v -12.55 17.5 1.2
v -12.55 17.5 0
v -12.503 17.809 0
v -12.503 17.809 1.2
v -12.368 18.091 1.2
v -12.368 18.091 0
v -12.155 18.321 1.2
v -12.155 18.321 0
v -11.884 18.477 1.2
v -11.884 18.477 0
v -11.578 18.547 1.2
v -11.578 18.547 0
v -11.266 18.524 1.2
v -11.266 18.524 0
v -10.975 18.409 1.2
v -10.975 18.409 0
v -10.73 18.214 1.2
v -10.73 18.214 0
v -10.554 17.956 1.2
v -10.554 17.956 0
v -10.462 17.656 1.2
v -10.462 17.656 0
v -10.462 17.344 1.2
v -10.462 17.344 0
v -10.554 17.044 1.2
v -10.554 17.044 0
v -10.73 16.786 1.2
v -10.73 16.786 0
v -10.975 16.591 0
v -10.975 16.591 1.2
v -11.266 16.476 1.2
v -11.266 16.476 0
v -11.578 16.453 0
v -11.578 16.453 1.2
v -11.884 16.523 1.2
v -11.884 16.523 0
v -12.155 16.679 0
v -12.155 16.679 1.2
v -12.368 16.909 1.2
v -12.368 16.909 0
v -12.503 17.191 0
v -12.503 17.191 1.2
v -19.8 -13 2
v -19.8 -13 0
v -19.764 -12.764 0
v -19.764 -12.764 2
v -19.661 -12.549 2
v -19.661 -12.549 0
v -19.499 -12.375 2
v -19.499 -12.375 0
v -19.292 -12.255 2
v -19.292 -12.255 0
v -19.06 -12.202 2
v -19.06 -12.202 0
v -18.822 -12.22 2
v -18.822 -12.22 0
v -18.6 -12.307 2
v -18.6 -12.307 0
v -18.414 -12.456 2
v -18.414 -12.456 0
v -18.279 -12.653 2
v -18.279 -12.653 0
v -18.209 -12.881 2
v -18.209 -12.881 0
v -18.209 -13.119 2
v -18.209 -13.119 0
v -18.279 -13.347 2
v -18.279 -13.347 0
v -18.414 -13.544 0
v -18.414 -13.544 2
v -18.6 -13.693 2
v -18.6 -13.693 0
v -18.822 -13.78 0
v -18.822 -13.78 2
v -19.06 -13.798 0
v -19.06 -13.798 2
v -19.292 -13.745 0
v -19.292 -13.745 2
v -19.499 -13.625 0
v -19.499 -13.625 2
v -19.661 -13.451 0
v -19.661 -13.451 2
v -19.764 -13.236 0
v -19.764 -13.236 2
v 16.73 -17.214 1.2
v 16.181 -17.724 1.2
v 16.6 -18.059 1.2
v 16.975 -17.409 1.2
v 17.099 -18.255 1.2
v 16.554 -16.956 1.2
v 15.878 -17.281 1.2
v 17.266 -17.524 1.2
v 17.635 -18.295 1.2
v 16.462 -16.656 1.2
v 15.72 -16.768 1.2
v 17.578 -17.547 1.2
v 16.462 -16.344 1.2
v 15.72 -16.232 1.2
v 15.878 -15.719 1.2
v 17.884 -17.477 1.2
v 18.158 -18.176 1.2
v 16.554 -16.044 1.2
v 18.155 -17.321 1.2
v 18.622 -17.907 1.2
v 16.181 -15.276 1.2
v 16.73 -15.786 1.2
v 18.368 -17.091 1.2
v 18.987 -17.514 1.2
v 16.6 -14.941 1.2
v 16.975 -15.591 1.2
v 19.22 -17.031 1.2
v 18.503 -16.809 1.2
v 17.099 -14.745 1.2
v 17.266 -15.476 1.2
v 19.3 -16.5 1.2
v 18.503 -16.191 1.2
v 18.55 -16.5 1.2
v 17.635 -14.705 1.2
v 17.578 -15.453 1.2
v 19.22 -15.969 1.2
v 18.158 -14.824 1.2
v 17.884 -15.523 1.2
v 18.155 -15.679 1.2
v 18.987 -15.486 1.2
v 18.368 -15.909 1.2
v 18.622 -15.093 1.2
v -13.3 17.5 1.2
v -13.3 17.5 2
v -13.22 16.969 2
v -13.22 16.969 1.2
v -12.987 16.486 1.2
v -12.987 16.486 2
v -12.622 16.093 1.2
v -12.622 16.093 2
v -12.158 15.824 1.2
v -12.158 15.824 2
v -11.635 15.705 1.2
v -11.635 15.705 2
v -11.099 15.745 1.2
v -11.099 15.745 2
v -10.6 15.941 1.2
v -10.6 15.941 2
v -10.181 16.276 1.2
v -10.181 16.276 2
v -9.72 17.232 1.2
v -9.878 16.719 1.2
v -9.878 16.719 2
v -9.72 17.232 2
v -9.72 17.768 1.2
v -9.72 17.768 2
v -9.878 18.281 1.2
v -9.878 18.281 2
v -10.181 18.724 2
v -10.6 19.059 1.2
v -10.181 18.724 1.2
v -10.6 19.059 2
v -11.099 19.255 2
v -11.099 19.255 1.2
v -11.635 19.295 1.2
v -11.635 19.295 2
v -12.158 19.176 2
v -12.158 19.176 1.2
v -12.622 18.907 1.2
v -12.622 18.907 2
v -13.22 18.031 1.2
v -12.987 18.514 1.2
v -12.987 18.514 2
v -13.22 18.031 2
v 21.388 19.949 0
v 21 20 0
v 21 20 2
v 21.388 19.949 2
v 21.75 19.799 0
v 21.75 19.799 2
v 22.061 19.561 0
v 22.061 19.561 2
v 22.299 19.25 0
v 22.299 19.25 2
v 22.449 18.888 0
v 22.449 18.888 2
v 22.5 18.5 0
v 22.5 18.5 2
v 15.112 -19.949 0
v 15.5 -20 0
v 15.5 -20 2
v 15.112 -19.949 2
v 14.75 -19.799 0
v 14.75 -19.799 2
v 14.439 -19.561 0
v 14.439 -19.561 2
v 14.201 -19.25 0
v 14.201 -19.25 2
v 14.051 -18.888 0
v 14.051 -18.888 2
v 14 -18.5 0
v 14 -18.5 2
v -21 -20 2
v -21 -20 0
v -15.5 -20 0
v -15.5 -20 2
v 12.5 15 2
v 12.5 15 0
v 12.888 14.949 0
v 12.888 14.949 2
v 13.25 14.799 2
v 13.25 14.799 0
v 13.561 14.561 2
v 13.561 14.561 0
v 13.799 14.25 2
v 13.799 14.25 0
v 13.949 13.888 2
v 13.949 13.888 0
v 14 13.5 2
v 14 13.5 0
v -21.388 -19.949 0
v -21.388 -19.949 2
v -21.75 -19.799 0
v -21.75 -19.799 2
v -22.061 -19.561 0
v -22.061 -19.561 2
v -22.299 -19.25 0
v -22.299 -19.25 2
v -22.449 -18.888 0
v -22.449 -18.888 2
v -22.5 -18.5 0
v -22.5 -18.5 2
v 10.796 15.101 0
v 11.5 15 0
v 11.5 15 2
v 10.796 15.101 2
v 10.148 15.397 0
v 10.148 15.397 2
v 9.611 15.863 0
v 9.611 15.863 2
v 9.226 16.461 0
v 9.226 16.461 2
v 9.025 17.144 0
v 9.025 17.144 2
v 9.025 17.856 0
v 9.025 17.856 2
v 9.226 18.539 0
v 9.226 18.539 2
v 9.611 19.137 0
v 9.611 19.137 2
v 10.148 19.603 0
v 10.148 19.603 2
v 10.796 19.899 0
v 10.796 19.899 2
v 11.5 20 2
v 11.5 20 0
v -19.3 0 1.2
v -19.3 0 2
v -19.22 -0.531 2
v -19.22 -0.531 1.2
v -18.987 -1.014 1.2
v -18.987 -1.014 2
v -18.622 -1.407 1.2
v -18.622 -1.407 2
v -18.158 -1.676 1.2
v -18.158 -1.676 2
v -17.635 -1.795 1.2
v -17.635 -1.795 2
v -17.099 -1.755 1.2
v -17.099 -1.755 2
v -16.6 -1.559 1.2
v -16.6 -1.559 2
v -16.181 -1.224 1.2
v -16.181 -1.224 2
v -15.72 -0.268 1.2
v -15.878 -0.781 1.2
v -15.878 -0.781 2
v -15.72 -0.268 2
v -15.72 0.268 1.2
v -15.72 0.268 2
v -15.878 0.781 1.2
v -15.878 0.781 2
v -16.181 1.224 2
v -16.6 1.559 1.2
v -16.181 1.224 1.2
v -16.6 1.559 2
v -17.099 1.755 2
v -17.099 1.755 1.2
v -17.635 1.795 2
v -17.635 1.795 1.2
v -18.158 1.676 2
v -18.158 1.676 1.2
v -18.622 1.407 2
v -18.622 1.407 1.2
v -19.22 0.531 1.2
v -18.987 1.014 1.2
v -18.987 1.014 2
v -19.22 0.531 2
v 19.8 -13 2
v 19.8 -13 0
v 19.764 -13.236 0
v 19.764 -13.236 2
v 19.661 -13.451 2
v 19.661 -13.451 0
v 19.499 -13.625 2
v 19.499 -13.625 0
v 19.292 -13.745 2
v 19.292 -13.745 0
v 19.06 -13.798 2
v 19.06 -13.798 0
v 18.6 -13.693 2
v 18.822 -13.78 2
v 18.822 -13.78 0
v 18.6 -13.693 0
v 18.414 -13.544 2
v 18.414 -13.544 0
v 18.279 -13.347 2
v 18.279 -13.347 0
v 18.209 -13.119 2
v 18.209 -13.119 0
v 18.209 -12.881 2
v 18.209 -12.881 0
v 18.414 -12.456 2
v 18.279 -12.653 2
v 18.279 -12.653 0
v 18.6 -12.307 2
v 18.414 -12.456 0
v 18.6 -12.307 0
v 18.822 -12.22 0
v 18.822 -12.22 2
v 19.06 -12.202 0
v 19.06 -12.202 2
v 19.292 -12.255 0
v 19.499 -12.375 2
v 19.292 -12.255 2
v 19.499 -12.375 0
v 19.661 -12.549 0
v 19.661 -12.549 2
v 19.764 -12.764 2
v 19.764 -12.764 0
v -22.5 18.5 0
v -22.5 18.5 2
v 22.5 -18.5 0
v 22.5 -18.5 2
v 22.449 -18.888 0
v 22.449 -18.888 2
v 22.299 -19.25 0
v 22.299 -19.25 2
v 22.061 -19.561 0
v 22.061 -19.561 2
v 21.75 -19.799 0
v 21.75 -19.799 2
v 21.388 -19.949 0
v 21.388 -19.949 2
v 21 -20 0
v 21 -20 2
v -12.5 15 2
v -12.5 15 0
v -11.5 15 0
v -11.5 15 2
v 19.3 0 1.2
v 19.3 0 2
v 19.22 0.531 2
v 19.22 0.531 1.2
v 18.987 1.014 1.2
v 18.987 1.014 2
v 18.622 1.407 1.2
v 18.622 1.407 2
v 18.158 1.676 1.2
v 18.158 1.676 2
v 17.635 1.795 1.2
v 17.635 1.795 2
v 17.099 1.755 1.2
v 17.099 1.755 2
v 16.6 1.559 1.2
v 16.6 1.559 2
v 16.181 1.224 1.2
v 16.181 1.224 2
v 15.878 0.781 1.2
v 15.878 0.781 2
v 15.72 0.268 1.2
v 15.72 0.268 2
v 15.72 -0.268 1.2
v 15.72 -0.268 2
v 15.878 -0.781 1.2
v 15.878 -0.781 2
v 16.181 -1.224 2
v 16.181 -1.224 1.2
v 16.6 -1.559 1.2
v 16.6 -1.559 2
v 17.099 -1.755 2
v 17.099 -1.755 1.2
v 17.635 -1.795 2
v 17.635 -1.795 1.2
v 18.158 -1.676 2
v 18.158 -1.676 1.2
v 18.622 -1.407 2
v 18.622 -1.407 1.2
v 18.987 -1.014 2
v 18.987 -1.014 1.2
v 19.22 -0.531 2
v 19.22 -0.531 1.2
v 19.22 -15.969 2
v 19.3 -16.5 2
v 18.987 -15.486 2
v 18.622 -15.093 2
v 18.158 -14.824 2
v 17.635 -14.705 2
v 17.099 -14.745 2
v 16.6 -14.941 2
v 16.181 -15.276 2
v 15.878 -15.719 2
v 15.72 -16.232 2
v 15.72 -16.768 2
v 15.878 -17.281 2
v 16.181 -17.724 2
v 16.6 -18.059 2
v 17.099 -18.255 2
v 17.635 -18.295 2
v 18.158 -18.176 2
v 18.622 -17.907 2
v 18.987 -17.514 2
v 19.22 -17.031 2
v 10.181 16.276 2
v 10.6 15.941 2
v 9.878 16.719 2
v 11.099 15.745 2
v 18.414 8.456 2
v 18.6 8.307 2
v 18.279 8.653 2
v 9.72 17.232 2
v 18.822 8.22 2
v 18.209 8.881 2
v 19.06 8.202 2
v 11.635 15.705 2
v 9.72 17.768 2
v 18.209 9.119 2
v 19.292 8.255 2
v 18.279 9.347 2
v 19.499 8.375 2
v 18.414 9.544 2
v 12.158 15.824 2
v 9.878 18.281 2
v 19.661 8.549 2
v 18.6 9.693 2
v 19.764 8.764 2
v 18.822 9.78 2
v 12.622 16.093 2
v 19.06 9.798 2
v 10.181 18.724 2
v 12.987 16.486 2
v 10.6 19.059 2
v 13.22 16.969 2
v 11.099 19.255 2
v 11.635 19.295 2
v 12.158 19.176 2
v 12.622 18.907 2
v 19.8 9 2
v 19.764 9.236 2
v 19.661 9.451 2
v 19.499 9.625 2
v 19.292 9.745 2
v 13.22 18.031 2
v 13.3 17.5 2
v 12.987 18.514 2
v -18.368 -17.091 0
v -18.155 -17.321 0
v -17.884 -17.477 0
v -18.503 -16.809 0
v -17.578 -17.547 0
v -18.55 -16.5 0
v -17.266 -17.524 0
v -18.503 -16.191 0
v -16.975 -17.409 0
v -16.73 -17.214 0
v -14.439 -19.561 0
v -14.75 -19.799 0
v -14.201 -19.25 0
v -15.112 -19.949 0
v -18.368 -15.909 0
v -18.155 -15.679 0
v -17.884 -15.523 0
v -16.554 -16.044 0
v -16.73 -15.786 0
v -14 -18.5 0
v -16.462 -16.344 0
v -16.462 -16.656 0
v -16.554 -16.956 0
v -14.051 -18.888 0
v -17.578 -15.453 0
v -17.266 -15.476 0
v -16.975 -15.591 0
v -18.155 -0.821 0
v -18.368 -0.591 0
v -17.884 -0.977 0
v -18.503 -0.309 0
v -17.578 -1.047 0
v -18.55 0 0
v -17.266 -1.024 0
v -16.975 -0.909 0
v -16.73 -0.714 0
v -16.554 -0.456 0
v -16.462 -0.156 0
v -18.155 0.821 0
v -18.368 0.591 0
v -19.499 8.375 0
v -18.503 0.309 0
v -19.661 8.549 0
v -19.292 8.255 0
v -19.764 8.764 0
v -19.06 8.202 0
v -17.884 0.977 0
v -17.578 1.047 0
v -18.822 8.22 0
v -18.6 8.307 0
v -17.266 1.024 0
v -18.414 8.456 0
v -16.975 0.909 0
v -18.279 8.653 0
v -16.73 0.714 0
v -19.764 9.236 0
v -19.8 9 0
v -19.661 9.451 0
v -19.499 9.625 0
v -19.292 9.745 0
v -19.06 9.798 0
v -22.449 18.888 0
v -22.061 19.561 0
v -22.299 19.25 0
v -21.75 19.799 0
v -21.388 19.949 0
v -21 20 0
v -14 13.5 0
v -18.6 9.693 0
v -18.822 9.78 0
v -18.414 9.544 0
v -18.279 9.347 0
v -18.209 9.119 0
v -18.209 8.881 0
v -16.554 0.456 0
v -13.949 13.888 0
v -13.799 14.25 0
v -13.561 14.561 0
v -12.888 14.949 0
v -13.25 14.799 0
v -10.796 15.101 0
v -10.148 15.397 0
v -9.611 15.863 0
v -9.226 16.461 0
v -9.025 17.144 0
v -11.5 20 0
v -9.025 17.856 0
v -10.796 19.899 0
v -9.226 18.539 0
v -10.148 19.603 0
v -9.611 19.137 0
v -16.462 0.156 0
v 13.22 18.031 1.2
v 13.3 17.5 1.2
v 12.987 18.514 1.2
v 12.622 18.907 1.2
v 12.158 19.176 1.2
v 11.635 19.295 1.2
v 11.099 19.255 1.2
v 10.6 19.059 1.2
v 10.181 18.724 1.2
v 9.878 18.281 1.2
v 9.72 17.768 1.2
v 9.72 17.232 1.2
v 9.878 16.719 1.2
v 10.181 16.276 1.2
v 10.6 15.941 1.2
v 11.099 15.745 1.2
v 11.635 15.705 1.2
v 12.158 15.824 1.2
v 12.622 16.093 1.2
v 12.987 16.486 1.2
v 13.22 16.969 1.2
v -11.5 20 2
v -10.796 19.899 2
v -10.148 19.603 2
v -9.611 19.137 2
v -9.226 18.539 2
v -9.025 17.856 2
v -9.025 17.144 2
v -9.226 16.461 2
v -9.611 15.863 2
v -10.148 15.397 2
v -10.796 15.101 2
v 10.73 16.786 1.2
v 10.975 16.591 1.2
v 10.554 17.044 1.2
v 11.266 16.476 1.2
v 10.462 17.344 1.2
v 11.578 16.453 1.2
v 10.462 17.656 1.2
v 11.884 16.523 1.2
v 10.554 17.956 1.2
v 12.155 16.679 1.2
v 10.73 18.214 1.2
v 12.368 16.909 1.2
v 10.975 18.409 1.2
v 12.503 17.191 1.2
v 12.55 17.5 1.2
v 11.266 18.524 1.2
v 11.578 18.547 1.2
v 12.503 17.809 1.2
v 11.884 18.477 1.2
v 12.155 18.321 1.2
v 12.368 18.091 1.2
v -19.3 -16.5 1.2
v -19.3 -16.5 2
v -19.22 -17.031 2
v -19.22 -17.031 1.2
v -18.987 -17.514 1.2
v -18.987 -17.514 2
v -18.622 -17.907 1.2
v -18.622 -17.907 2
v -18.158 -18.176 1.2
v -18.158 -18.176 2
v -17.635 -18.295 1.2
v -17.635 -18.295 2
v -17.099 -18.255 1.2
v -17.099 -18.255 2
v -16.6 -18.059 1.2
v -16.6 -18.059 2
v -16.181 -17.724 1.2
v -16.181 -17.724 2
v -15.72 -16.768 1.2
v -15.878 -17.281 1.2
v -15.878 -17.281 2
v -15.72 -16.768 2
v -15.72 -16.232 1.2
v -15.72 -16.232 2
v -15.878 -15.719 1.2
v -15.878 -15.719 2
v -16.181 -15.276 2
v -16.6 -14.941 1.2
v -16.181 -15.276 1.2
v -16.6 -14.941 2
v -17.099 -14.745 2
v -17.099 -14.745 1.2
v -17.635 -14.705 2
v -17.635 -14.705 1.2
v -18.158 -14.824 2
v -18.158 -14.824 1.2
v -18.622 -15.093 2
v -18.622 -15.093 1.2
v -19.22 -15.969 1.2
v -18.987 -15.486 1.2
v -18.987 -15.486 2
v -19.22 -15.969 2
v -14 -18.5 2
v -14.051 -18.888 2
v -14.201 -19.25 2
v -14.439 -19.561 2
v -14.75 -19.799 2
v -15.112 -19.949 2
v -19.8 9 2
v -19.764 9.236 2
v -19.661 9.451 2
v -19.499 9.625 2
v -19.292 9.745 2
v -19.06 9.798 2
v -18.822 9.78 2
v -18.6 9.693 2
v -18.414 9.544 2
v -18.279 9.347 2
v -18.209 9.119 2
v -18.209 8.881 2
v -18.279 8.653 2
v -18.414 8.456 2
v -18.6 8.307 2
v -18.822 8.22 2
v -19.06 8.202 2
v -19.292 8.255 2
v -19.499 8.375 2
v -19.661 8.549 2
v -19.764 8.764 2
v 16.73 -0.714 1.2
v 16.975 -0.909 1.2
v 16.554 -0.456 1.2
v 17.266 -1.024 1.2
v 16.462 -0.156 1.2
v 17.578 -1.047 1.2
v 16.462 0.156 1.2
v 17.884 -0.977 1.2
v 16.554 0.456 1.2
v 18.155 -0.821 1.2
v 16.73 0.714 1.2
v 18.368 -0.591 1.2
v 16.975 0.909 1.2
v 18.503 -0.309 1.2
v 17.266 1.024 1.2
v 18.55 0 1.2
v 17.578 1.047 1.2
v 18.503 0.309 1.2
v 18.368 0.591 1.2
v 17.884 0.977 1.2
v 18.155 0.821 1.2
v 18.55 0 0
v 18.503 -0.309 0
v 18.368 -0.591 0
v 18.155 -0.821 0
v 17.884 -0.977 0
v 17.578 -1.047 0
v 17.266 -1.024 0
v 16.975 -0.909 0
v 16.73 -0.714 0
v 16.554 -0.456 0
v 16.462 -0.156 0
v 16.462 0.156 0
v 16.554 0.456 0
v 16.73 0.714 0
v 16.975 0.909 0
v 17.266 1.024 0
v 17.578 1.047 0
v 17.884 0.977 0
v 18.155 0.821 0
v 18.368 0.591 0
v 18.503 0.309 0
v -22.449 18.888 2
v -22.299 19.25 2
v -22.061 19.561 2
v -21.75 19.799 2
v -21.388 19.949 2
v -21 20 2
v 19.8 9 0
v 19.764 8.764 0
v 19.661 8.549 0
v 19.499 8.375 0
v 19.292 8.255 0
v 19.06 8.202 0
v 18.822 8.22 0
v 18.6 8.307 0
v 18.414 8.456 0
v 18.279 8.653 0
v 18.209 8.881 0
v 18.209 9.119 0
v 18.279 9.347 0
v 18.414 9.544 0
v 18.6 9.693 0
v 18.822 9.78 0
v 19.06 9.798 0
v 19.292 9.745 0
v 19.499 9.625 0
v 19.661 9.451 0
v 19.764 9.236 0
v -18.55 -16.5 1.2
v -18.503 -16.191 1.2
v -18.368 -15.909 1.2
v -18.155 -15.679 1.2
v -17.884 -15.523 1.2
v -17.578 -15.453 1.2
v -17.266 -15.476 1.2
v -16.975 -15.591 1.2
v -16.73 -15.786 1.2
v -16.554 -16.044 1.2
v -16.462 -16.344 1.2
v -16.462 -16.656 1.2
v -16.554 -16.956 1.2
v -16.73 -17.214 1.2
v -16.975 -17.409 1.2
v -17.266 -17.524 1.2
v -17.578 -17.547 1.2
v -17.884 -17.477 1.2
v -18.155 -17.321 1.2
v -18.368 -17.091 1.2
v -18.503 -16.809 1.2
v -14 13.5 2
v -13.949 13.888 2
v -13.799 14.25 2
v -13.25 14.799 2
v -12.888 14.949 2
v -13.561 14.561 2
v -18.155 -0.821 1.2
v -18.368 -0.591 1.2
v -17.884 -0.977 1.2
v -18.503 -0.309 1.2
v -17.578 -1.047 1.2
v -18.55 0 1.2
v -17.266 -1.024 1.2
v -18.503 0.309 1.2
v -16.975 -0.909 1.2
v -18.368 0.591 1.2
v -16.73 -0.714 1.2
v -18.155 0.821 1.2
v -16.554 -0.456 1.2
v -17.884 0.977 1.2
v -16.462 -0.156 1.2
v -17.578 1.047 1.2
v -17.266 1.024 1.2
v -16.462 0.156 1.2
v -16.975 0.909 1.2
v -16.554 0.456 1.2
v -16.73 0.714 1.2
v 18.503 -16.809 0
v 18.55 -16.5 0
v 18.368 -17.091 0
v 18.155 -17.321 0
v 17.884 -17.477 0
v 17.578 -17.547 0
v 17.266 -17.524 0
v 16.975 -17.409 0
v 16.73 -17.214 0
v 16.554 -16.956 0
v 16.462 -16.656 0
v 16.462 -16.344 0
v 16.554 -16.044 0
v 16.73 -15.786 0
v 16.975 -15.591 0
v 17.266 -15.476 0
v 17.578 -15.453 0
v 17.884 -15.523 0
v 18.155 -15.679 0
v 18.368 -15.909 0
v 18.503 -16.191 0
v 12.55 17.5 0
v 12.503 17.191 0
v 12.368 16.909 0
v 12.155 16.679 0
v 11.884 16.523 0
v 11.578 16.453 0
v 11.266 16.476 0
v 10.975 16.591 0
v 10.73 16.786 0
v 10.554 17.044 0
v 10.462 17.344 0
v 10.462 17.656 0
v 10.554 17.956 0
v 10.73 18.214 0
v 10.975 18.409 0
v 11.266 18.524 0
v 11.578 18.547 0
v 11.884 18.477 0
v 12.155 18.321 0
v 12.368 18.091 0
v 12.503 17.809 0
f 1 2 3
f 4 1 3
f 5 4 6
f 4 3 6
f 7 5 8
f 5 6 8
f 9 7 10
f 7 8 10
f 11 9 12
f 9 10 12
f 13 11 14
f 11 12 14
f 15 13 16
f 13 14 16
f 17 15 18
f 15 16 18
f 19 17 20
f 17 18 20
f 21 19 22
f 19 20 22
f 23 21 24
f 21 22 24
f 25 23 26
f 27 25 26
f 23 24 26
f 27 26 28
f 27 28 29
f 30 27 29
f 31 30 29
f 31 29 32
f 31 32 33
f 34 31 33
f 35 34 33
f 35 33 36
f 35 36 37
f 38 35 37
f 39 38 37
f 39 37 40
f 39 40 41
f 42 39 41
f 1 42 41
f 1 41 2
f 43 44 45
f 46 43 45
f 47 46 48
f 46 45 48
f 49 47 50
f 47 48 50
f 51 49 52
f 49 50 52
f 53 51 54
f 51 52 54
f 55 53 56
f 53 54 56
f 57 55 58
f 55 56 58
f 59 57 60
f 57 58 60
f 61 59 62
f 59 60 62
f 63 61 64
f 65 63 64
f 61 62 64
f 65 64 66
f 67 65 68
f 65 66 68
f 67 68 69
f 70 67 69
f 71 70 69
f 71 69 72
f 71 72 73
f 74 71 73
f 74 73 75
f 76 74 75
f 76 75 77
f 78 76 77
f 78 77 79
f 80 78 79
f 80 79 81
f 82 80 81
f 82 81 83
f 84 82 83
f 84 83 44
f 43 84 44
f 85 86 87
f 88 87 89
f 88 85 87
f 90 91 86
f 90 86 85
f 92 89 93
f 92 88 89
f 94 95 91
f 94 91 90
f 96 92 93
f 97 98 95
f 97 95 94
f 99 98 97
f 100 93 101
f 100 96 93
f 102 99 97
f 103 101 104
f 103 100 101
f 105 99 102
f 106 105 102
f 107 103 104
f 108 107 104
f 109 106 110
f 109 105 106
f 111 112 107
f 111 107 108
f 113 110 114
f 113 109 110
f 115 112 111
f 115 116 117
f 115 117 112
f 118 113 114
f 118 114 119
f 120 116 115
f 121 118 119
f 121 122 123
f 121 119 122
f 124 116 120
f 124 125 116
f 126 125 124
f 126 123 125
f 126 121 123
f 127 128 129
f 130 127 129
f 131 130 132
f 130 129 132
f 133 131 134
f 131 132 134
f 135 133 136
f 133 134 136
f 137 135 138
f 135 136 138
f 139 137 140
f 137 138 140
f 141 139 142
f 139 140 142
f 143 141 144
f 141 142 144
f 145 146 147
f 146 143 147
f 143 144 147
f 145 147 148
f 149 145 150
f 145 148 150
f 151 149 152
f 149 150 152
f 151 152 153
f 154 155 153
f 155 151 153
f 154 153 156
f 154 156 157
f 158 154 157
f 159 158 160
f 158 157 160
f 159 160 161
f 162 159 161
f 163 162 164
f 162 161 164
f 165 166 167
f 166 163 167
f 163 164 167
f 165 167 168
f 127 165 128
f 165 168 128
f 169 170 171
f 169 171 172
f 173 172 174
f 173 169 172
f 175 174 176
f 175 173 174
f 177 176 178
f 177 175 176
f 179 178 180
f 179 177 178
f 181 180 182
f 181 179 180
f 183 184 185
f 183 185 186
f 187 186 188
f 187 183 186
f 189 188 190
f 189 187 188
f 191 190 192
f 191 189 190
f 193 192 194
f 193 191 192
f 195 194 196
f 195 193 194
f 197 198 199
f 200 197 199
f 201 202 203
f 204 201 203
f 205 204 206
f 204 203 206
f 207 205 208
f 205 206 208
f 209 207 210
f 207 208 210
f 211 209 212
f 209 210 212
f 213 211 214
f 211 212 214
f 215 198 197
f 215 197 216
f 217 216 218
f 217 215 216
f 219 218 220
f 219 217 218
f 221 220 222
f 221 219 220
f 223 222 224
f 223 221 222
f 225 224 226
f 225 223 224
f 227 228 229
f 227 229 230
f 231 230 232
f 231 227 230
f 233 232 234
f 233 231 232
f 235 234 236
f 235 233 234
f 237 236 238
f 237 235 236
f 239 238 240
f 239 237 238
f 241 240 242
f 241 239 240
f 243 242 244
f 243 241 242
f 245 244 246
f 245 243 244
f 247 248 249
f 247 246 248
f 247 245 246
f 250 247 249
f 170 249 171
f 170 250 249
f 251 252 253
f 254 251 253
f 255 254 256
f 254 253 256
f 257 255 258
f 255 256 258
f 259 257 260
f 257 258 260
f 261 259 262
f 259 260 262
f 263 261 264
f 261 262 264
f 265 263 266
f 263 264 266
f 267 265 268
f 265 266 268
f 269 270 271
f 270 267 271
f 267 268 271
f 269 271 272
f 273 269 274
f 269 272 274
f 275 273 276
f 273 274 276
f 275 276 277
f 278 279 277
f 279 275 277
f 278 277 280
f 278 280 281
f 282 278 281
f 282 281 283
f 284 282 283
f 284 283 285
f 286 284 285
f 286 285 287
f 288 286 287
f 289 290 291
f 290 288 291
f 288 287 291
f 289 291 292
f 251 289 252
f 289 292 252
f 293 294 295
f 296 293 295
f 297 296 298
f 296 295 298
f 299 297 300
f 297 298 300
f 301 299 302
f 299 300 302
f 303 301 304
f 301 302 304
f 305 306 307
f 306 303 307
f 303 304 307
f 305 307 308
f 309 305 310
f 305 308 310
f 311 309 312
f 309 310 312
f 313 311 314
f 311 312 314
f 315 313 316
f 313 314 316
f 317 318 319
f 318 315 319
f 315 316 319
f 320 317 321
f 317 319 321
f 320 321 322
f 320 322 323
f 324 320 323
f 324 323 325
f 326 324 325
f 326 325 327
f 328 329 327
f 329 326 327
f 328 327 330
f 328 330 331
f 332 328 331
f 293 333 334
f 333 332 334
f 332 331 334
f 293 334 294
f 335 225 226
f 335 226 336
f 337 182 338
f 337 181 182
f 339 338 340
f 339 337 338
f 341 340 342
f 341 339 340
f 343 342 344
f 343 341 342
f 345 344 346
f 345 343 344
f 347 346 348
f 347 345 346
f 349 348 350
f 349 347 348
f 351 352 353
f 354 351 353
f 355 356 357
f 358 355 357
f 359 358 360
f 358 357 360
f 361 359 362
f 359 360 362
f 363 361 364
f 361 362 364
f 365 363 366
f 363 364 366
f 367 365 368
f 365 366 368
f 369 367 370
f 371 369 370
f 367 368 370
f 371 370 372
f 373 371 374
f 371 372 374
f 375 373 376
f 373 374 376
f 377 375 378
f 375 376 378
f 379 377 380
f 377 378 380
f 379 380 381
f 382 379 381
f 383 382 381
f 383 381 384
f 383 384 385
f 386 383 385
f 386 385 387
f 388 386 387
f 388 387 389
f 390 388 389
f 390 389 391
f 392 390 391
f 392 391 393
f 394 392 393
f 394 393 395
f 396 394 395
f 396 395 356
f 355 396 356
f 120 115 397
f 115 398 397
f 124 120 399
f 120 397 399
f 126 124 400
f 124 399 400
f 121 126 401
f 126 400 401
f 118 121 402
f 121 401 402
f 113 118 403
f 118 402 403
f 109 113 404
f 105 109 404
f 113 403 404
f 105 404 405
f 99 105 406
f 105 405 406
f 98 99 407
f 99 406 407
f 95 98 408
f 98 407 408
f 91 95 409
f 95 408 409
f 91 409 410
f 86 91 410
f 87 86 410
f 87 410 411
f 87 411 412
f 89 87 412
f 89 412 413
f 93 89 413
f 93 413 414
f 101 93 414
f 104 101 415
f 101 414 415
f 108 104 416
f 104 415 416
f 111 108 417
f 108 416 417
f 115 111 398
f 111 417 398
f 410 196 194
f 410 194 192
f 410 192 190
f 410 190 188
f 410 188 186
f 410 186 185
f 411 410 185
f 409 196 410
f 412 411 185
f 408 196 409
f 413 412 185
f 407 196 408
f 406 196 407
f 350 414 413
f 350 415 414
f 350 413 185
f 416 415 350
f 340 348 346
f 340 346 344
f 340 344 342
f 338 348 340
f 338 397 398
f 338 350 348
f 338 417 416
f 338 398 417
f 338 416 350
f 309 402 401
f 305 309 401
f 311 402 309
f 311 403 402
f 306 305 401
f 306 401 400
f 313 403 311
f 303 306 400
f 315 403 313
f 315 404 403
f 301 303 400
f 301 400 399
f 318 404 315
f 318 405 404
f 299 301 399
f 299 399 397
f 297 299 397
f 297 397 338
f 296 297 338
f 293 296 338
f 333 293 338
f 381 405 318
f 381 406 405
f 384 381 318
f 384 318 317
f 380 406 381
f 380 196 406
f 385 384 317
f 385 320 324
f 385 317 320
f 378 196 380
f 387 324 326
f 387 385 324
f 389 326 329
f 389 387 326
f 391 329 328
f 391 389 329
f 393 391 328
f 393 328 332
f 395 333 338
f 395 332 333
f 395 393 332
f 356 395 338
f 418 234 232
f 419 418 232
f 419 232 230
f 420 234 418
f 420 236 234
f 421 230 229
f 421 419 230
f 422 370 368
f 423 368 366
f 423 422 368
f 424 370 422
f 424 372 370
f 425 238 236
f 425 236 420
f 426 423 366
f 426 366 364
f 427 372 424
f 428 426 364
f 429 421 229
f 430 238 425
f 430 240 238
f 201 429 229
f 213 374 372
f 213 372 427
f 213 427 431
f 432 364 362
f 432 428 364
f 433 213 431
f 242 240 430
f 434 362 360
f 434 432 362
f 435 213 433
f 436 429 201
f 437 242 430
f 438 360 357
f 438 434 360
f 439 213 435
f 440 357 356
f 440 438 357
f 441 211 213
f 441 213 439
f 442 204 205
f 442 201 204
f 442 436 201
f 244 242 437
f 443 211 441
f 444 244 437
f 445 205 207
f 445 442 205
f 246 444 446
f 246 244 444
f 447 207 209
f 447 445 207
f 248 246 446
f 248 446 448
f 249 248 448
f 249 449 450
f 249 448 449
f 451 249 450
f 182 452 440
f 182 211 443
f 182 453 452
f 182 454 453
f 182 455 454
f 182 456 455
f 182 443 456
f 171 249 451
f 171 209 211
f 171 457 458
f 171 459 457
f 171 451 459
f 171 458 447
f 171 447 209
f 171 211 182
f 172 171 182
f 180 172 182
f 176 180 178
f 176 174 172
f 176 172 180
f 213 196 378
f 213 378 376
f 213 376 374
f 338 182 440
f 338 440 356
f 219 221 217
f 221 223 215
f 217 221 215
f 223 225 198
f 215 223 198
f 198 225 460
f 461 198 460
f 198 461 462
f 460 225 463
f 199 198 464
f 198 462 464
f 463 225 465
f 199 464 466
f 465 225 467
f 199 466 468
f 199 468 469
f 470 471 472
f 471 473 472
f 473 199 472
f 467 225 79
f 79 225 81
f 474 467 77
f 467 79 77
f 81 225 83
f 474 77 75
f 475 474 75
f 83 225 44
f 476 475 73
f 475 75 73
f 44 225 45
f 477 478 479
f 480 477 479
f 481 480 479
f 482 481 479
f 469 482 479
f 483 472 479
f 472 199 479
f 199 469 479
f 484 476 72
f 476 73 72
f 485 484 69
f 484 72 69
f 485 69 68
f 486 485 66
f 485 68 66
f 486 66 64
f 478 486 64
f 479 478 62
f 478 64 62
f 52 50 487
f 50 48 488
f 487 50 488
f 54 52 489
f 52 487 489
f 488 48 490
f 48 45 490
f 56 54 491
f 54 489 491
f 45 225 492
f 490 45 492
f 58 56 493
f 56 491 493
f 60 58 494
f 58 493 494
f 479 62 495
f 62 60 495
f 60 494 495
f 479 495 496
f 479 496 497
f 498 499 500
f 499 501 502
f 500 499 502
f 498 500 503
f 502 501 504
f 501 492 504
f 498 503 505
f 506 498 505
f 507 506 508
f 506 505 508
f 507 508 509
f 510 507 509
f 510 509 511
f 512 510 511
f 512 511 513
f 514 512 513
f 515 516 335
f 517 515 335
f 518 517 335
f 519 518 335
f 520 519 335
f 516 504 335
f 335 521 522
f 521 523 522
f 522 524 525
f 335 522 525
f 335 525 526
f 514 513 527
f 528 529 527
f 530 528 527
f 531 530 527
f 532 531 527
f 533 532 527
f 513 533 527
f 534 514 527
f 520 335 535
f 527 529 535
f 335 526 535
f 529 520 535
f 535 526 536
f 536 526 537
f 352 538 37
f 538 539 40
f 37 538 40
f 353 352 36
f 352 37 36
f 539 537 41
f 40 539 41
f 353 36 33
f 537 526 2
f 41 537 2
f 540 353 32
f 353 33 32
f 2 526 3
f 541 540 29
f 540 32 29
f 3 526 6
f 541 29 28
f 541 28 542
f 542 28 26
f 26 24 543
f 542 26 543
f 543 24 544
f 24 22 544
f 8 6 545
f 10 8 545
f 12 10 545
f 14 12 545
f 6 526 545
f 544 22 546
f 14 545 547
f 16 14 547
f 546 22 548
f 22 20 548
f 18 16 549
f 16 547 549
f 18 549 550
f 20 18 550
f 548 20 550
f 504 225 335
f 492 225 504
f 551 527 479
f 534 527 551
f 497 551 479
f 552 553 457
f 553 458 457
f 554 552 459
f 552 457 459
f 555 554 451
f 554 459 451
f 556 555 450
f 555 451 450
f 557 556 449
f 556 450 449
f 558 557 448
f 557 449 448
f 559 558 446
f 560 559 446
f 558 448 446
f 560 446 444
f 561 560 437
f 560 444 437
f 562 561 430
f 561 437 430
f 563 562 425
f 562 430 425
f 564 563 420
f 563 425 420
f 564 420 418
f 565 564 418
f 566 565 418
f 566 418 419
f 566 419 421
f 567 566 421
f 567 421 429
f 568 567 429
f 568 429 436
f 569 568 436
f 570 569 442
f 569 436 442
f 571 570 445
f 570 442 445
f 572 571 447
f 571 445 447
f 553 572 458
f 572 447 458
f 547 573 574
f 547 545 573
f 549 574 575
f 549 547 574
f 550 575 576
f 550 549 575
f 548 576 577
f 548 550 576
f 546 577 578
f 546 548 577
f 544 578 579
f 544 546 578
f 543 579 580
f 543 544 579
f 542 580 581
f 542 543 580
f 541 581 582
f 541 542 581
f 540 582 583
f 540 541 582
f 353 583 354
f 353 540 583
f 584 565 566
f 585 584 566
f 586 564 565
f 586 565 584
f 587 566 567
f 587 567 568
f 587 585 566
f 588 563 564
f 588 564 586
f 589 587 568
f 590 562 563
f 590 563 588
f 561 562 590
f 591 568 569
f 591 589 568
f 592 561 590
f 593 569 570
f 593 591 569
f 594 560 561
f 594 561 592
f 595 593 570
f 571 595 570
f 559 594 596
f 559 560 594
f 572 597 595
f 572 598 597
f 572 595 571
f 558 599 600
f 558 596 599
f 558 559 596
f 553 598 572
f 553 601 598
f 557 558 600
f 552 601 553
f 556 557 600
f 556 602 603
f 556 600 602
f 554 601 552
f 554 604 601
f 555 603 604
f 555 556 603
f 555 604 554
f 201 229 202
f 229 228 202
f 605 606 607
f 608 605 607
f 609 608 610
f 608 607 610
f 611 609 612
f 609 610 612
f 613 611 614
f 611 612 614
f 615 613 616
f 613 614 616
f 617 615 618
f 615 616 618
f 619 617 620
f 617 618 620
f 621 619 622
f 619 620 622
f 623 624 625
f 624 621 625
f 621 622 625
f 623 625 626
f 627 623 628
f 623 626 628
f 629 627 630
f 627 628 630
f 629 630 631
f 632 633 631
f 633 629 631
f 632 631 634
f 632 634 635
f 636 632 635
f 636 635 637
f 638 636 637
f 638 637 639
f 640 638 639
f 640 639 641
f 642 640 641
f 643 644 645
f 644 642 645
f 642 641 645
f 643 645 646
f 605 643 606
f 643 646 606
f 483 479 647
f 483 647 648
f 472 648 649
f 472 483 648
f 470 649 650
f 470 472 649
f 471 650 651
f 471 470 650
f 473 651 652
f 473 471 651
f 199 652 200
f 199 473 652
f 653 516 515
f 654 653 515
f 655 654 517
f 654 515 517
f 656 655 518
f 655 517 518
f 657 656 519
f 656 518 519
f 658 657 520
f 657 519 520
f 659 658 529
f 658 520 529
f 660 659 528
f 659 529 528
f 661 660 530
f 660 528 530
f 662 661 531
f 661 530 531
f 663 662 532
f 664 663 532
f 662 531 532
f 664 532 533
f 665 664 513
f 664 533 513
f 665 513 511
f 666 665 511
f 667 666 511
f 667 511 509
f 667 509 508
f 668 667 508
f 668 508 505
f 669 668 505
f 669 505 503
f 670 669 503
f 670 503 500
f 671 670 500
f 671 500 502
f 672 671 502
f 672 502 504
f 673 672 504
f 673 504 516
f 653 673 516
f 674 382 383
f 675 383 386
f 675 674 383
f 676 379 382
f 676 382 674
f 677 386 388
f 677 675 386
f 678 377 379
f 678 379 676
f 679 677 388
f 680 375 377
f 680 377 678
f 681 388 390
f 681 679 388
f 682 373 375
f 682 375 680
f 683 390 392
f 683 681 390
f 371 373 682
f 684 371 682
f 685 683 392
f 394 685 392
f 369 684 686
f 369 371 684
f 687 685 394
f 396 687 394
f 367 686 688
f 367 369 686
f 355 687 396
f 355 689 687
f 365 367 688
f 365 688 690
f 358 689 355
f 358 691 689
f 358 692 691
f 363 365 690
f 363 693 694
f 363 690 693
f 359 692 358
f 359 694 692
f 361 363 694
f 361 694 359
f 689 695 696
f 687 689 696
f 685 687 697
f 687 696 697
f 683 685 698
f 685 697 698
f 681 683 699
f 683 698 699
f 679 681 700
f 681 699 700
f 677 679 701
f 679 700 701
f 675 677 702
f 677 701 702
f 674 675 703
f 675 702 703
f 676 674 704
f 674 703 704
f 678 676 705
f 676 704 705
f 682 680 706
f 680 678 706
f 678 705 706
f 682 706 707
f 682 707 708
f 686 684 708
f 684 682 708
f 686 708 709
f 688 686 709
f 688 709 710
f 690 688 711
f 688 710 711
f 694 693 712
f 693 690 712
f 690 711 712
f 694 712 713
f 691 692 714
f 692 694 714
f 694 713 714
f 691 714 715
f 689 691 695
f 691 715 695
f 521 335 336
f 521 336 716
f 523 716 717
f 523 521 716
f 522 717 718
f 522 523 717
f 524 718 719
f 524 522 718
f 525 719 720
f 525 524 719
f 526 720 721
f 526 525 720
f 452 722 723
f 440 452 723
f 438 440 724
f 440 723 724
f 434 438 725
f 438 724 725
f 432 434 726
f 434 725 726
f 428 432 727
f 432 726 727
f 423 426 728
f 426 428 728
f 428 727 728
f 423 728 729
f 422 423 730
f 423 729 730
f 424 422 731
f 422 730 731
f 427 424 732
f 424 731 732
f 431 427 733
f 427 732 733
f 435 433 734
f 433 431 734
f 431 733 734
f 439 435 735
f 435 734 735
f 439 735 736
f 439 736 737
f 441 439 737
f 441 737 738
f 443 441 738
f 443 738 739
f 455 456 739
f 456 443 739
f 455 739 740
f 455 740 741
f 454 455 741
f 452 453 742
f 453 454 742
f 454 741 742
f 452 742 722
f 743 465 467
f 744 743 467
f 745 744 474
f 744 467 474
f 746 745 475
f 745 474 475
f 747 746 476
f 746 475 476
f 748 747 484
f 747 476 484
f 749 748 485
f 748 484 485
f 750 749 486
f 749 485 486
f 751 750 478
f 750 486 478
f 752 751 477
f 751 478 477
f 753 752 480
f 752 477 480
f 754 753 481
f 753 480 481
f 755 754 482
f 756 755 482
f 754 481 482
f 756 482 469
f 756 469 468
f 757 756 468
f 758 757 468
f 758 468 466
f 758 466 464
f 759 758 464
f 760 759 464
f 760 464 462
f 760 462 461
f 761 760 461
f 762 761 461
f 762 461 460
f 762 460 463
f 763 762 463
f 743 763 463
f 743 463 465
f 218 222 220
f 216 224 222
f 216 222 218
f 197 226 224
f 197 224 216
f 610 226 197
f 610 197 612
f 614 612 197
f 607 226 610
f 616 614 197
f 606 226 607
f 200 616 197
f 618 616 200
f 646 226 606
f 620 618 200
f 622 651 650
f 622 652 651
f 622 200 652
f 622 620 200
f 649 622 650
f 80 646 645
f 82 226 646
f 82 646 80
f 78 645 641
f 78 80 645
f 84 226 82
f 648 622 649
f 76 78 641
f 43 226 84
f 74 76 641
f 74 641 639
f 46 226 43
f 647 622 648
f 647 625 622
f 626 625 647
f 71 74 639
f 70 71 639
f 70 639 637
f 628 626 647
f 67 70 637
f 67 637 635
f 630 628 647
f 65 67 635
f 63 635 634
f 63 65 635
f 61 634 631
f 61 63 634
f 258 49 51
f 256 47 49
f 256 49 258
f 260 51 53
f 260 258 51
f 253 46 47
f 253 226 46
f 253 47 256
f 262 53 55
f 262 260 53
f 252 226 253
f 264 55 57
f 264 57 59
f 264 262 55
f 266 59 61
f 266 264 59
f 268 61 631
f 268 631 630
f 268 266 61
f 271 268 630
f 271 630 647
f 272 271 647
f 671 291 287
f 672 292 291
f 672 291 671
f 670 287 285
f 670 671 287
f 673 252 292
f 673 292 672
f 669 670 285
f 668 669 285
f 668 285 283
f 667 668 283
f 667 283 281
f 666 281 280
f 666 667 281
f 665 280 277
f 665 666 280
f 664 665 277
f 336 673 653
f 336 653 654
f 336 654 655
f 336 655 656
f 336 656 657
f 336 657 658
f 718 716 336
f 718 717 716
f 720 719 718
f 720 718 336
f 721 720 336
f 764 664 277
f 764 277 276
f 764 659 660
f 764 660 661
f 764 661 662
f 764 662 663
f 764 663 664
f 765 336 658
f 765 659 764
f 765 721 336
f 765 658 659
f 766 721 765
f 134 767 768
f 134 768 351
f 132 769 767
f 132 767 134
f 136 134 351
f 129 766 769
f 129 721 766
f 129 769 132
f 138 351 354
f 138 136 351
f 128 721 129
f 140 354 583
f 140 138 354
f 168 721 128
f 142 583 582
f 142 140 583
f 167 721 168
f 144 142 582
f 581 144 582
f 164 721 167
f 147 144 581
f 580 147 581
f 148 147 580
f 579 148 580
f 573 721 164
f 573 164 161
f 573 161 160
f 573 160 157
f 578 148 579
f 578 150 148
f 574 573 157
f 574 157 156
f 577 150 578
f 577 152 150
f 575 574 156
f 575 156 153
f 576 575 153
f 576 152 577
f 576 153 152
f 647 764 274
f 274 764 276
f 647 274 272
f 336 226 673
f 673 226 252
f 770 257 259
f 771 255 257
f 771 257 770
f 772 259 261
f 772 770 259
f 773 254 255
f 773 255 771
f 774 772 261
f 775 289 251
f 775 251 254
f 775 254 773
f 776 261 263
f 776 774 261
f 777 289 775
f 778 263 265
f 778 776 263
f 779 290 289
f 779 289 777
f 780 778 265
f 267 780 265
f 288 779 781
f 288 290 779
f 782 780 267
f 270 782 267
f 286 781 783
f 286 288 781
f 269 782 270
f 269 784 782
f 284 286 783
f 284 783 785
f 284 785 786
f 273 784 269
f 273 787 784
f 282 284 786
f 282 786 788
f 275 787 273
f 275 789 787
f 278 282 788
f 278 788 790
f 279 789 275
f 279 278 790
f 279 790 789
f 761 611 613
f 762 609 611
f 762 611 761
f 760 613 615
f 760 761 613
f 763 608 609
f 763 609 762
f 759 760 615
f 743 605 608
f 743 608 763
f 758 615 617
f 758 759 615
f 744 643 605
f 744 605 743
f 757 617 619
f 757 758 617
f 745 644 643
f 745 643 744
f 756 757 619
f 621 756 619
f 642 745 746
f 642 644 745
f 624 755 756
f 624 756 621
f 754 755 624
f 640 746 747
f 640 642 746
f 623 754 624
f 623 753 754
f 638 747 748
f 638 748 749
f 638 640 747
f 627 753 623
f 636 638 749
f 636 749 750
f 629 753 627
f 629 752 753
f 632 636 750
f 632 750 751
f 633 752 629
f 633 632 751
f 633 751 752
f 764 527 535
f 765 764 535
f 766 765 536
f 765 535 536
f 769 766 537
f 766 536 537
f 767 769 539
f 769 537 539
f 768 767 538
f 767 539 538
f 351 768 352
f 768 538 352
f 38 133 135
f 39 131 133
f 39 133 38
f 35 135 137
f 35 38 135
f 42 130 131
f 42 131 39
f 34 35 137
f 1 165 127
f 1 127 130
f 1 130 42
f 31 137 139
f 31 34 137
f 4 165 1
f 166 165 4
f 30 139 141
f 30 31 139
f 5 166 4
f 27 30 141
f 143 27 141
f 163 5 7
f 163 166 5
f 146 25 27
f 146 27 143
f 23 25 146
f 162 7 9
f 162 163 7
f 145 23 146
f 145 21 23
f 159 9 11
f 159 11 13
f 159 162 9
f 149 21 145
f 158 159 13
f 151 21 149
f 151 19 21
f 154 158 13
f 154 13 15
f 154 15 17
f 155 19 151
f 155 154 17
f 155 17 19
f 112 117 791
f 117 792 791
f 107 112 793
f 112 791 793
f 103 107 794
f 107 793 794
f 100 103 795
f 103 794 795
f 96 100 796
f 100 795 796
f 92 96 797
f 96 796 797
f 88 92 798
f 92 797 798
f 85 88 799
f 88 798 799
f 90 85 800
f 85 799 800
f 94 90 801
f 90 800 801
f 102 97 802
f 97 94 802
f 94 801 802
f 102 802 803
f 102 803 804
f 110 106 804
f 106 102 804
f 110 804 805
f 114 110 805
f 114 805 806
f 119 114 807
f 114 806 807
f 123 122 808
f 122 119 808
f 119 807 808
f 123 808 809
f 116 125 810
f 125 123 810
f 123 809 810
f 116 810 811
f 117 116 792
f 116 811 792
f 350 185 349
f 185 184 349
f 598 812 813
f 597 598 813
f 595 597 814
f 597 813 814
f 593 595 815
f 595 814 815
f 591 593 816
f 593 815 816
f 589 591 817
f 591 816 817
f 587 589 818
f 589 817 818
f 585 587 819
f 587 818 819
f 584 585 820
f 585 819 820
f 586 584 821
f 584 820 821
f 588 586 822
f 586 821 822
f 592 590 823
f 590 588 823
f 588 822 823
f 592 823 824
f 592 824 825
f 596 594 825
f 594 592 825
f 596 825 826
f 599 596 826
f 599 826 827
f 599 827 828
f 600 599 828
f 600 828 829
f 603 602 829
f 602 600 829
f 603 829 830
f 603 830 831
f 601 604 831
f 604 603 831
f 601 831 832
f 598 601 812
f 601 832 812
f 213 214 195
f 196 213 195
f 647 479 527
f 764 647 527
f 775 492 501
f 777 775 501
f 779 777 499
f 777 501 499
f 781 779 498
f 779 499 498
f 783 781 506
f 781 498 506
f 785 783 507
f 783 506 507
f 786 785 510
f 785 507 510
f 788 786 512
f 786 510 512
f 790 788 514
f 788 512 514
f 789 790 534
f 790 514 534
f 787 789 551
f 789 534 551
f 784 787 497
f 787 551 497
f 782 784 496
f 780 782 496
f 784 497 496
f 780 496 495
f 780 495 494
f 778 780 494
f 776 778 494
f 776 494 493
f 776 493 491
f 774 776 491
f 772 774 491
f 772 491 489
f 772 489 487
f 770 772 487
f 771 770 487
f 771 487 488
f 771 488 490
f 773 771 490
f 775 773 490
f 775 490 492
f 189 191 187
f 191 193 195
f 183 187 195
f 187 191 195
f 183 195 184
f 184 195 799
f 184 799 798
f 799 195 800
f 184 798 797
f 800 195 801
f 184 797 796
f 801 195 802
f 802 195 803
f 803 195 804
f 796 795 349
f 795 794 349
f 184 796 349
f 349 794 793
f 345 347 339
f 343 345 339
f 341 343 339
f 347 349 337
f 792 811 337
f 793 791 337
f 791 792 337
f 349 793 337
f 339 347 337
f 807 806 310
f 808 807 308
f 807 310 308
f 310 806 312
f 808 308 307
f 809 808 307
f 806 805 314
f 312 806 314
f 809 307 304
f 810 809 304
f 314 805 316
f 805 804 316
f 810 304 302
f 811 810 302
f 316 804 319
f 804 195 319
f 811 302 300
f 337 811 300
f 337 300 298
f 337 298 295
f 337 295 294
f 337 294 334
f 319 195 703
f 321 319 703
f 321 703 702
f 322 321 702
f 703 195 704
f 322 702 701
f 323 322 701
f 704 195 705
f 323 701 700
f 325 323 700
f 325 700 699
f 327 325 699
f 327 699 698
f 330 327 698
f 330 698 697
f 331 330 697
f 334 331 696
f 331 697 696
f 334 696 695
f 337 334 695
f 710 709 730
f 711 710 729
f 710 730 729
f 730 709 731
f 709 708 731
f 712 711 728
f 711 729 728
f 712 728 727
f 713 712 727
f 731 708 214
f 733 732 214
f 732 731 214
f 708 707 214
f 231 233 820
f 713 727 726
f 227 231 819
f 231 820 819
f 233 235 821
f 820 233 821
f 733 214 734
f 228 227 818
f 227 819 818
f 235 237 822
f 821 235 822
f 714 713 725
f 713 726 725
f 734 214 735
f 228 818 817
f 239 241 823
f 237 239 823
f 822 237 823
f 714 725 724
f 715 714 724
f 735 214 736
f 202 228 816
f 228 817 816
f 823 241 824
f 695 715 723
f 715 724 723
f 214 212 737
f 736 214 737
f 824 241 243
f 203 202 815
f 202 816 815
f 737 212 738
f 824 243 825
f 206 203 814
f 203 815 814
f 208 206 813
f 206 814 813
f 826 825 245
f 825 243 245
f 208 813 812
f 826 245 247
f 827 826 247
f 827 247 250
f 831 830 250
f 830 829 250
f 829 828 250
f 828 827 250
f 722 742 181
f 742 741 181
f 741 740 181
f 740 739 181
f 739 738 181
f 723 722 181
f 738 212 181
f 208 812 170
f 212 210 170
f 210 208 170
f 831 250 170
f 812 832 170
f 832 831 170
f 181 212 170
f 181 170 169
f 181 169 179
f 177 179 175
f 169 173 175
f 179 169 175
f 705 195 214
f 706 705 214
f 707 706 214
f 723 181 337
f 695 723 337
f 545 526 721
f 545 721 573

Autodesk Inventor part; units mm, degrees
ref_plane "YZ Plane" through (0, 0, 0) normal (1, 0, 0) x (0, 1, 0)
ref_plane "XZ Plane" through (0, 0, 0) normal (0, 1, 0) x (-1, 0, 0)
ref_plane "XY Plane" through (0, 0, 0) normal (0, 0, 1) x (1, 0, 0)
sketch "スケッチ1" plane through (0, 0, 0) normal (0, 0, 1) x (1, 0, 0)
  line L0 (0, 2.2573) -> (0, 51.1276) construction
  line L1 (22.5, 18.5) -> (22.5, -18.5)
  line L2 (19, 9) -> (19, 13) construction
  line L3 (19, -9) -> (19, -13) construction
  line L4 (14, 13.5) -> (14, -18.5)
  line L5 (11.5, 20) -> (21, 20)
  circle A0 centre (17.5, 0) radius 1.05
  circle A1 centre (11.5, 17.5) radius 1.05
  line L6 (17.5, 0) -> (17.5, -16.5) construction
  circle A2 centre (17.5, -16.5) radius 1.05
  arc A3 (11.5, 20) -> (11.5, 15) centre (11.5, 17.5) ccw
  line L7 (15.5, -20) -> (21, -20)
  arc A4 (21, -20) -> (22.5, -18.5) centre (21, -18.5) ccw
  arc A5 (22.5, 18.5) -> (21, 20) centre (21, 18.5) ccw
  arc A6 (14, -18.5) -> (15.5, -20) centre (15.5, -18.5) ccw
  line L8 (-4.5621, 0) -> (27.3728, 0) construction
  line L9 (11.5, 15) -> (12.5, 15)
  arc A7 (14, 13.5) -> (12.5, 15) centre (12.5, 13.5) ccw
  circle A8 centre (19, 9) radius 0.8
  circle A9 centre (19, -13) radius 0.8
  dimension "d6" = 4
  dimension "d10" = 4
  dimension "d19" = 2.1
  dimension "d20" = 9
  dimension "d22" = 2.1
  dimension "d28" = 38
  dimension "d29" = 45
  dimension "d41" = 3.5
  dimension "d46" = 2.5
  dimension "d47" = 35
  dimension "d48" = 9
  dimension "d50" = 22
  dimension "d51" = 1.5
  dimension "d52" = 3.5
  dimension "d53" = 1.5
  dimension "d54" = 40
  dimension "d55" = 28
  dimension "d56" = 1.5
  dimension "d57" = 2.5
  dimension "d58" = 1.6
  dimension "d59" = 1.6
extrude "押し出し1" add sketch "スケッチ1" along normal blind 2
sketch "スケッチ3" plane through (0, 0, 2) normal (0, 0, 1) x (1, 0, 0)
  circle A0 centre (17.5, 0) radius 1.05 projected
  circle A1 centre (17.5, 0) radius 1.8
  circle A2 centre (11.5, 17.5) radius 1.05 projected
  circle A3 centre (11.5, 17.5) radius 1.8
  circle A4 centre (17.5, -16.5) radius 1.05 projected
  circle A5 centre (17.5, -16.5) radius 1.8
  point P0 (0, 0)
  dimension "d33" = 3.6
extrude "押し出し2" cut sketch "スケッチ3" against normal blind 0.8
mirror "ミラー1" about plane through (0, 0, 0) normal (1, 0, 0) of "押し出し1", "押し出し2"
properties part number "battery_cover_base"
